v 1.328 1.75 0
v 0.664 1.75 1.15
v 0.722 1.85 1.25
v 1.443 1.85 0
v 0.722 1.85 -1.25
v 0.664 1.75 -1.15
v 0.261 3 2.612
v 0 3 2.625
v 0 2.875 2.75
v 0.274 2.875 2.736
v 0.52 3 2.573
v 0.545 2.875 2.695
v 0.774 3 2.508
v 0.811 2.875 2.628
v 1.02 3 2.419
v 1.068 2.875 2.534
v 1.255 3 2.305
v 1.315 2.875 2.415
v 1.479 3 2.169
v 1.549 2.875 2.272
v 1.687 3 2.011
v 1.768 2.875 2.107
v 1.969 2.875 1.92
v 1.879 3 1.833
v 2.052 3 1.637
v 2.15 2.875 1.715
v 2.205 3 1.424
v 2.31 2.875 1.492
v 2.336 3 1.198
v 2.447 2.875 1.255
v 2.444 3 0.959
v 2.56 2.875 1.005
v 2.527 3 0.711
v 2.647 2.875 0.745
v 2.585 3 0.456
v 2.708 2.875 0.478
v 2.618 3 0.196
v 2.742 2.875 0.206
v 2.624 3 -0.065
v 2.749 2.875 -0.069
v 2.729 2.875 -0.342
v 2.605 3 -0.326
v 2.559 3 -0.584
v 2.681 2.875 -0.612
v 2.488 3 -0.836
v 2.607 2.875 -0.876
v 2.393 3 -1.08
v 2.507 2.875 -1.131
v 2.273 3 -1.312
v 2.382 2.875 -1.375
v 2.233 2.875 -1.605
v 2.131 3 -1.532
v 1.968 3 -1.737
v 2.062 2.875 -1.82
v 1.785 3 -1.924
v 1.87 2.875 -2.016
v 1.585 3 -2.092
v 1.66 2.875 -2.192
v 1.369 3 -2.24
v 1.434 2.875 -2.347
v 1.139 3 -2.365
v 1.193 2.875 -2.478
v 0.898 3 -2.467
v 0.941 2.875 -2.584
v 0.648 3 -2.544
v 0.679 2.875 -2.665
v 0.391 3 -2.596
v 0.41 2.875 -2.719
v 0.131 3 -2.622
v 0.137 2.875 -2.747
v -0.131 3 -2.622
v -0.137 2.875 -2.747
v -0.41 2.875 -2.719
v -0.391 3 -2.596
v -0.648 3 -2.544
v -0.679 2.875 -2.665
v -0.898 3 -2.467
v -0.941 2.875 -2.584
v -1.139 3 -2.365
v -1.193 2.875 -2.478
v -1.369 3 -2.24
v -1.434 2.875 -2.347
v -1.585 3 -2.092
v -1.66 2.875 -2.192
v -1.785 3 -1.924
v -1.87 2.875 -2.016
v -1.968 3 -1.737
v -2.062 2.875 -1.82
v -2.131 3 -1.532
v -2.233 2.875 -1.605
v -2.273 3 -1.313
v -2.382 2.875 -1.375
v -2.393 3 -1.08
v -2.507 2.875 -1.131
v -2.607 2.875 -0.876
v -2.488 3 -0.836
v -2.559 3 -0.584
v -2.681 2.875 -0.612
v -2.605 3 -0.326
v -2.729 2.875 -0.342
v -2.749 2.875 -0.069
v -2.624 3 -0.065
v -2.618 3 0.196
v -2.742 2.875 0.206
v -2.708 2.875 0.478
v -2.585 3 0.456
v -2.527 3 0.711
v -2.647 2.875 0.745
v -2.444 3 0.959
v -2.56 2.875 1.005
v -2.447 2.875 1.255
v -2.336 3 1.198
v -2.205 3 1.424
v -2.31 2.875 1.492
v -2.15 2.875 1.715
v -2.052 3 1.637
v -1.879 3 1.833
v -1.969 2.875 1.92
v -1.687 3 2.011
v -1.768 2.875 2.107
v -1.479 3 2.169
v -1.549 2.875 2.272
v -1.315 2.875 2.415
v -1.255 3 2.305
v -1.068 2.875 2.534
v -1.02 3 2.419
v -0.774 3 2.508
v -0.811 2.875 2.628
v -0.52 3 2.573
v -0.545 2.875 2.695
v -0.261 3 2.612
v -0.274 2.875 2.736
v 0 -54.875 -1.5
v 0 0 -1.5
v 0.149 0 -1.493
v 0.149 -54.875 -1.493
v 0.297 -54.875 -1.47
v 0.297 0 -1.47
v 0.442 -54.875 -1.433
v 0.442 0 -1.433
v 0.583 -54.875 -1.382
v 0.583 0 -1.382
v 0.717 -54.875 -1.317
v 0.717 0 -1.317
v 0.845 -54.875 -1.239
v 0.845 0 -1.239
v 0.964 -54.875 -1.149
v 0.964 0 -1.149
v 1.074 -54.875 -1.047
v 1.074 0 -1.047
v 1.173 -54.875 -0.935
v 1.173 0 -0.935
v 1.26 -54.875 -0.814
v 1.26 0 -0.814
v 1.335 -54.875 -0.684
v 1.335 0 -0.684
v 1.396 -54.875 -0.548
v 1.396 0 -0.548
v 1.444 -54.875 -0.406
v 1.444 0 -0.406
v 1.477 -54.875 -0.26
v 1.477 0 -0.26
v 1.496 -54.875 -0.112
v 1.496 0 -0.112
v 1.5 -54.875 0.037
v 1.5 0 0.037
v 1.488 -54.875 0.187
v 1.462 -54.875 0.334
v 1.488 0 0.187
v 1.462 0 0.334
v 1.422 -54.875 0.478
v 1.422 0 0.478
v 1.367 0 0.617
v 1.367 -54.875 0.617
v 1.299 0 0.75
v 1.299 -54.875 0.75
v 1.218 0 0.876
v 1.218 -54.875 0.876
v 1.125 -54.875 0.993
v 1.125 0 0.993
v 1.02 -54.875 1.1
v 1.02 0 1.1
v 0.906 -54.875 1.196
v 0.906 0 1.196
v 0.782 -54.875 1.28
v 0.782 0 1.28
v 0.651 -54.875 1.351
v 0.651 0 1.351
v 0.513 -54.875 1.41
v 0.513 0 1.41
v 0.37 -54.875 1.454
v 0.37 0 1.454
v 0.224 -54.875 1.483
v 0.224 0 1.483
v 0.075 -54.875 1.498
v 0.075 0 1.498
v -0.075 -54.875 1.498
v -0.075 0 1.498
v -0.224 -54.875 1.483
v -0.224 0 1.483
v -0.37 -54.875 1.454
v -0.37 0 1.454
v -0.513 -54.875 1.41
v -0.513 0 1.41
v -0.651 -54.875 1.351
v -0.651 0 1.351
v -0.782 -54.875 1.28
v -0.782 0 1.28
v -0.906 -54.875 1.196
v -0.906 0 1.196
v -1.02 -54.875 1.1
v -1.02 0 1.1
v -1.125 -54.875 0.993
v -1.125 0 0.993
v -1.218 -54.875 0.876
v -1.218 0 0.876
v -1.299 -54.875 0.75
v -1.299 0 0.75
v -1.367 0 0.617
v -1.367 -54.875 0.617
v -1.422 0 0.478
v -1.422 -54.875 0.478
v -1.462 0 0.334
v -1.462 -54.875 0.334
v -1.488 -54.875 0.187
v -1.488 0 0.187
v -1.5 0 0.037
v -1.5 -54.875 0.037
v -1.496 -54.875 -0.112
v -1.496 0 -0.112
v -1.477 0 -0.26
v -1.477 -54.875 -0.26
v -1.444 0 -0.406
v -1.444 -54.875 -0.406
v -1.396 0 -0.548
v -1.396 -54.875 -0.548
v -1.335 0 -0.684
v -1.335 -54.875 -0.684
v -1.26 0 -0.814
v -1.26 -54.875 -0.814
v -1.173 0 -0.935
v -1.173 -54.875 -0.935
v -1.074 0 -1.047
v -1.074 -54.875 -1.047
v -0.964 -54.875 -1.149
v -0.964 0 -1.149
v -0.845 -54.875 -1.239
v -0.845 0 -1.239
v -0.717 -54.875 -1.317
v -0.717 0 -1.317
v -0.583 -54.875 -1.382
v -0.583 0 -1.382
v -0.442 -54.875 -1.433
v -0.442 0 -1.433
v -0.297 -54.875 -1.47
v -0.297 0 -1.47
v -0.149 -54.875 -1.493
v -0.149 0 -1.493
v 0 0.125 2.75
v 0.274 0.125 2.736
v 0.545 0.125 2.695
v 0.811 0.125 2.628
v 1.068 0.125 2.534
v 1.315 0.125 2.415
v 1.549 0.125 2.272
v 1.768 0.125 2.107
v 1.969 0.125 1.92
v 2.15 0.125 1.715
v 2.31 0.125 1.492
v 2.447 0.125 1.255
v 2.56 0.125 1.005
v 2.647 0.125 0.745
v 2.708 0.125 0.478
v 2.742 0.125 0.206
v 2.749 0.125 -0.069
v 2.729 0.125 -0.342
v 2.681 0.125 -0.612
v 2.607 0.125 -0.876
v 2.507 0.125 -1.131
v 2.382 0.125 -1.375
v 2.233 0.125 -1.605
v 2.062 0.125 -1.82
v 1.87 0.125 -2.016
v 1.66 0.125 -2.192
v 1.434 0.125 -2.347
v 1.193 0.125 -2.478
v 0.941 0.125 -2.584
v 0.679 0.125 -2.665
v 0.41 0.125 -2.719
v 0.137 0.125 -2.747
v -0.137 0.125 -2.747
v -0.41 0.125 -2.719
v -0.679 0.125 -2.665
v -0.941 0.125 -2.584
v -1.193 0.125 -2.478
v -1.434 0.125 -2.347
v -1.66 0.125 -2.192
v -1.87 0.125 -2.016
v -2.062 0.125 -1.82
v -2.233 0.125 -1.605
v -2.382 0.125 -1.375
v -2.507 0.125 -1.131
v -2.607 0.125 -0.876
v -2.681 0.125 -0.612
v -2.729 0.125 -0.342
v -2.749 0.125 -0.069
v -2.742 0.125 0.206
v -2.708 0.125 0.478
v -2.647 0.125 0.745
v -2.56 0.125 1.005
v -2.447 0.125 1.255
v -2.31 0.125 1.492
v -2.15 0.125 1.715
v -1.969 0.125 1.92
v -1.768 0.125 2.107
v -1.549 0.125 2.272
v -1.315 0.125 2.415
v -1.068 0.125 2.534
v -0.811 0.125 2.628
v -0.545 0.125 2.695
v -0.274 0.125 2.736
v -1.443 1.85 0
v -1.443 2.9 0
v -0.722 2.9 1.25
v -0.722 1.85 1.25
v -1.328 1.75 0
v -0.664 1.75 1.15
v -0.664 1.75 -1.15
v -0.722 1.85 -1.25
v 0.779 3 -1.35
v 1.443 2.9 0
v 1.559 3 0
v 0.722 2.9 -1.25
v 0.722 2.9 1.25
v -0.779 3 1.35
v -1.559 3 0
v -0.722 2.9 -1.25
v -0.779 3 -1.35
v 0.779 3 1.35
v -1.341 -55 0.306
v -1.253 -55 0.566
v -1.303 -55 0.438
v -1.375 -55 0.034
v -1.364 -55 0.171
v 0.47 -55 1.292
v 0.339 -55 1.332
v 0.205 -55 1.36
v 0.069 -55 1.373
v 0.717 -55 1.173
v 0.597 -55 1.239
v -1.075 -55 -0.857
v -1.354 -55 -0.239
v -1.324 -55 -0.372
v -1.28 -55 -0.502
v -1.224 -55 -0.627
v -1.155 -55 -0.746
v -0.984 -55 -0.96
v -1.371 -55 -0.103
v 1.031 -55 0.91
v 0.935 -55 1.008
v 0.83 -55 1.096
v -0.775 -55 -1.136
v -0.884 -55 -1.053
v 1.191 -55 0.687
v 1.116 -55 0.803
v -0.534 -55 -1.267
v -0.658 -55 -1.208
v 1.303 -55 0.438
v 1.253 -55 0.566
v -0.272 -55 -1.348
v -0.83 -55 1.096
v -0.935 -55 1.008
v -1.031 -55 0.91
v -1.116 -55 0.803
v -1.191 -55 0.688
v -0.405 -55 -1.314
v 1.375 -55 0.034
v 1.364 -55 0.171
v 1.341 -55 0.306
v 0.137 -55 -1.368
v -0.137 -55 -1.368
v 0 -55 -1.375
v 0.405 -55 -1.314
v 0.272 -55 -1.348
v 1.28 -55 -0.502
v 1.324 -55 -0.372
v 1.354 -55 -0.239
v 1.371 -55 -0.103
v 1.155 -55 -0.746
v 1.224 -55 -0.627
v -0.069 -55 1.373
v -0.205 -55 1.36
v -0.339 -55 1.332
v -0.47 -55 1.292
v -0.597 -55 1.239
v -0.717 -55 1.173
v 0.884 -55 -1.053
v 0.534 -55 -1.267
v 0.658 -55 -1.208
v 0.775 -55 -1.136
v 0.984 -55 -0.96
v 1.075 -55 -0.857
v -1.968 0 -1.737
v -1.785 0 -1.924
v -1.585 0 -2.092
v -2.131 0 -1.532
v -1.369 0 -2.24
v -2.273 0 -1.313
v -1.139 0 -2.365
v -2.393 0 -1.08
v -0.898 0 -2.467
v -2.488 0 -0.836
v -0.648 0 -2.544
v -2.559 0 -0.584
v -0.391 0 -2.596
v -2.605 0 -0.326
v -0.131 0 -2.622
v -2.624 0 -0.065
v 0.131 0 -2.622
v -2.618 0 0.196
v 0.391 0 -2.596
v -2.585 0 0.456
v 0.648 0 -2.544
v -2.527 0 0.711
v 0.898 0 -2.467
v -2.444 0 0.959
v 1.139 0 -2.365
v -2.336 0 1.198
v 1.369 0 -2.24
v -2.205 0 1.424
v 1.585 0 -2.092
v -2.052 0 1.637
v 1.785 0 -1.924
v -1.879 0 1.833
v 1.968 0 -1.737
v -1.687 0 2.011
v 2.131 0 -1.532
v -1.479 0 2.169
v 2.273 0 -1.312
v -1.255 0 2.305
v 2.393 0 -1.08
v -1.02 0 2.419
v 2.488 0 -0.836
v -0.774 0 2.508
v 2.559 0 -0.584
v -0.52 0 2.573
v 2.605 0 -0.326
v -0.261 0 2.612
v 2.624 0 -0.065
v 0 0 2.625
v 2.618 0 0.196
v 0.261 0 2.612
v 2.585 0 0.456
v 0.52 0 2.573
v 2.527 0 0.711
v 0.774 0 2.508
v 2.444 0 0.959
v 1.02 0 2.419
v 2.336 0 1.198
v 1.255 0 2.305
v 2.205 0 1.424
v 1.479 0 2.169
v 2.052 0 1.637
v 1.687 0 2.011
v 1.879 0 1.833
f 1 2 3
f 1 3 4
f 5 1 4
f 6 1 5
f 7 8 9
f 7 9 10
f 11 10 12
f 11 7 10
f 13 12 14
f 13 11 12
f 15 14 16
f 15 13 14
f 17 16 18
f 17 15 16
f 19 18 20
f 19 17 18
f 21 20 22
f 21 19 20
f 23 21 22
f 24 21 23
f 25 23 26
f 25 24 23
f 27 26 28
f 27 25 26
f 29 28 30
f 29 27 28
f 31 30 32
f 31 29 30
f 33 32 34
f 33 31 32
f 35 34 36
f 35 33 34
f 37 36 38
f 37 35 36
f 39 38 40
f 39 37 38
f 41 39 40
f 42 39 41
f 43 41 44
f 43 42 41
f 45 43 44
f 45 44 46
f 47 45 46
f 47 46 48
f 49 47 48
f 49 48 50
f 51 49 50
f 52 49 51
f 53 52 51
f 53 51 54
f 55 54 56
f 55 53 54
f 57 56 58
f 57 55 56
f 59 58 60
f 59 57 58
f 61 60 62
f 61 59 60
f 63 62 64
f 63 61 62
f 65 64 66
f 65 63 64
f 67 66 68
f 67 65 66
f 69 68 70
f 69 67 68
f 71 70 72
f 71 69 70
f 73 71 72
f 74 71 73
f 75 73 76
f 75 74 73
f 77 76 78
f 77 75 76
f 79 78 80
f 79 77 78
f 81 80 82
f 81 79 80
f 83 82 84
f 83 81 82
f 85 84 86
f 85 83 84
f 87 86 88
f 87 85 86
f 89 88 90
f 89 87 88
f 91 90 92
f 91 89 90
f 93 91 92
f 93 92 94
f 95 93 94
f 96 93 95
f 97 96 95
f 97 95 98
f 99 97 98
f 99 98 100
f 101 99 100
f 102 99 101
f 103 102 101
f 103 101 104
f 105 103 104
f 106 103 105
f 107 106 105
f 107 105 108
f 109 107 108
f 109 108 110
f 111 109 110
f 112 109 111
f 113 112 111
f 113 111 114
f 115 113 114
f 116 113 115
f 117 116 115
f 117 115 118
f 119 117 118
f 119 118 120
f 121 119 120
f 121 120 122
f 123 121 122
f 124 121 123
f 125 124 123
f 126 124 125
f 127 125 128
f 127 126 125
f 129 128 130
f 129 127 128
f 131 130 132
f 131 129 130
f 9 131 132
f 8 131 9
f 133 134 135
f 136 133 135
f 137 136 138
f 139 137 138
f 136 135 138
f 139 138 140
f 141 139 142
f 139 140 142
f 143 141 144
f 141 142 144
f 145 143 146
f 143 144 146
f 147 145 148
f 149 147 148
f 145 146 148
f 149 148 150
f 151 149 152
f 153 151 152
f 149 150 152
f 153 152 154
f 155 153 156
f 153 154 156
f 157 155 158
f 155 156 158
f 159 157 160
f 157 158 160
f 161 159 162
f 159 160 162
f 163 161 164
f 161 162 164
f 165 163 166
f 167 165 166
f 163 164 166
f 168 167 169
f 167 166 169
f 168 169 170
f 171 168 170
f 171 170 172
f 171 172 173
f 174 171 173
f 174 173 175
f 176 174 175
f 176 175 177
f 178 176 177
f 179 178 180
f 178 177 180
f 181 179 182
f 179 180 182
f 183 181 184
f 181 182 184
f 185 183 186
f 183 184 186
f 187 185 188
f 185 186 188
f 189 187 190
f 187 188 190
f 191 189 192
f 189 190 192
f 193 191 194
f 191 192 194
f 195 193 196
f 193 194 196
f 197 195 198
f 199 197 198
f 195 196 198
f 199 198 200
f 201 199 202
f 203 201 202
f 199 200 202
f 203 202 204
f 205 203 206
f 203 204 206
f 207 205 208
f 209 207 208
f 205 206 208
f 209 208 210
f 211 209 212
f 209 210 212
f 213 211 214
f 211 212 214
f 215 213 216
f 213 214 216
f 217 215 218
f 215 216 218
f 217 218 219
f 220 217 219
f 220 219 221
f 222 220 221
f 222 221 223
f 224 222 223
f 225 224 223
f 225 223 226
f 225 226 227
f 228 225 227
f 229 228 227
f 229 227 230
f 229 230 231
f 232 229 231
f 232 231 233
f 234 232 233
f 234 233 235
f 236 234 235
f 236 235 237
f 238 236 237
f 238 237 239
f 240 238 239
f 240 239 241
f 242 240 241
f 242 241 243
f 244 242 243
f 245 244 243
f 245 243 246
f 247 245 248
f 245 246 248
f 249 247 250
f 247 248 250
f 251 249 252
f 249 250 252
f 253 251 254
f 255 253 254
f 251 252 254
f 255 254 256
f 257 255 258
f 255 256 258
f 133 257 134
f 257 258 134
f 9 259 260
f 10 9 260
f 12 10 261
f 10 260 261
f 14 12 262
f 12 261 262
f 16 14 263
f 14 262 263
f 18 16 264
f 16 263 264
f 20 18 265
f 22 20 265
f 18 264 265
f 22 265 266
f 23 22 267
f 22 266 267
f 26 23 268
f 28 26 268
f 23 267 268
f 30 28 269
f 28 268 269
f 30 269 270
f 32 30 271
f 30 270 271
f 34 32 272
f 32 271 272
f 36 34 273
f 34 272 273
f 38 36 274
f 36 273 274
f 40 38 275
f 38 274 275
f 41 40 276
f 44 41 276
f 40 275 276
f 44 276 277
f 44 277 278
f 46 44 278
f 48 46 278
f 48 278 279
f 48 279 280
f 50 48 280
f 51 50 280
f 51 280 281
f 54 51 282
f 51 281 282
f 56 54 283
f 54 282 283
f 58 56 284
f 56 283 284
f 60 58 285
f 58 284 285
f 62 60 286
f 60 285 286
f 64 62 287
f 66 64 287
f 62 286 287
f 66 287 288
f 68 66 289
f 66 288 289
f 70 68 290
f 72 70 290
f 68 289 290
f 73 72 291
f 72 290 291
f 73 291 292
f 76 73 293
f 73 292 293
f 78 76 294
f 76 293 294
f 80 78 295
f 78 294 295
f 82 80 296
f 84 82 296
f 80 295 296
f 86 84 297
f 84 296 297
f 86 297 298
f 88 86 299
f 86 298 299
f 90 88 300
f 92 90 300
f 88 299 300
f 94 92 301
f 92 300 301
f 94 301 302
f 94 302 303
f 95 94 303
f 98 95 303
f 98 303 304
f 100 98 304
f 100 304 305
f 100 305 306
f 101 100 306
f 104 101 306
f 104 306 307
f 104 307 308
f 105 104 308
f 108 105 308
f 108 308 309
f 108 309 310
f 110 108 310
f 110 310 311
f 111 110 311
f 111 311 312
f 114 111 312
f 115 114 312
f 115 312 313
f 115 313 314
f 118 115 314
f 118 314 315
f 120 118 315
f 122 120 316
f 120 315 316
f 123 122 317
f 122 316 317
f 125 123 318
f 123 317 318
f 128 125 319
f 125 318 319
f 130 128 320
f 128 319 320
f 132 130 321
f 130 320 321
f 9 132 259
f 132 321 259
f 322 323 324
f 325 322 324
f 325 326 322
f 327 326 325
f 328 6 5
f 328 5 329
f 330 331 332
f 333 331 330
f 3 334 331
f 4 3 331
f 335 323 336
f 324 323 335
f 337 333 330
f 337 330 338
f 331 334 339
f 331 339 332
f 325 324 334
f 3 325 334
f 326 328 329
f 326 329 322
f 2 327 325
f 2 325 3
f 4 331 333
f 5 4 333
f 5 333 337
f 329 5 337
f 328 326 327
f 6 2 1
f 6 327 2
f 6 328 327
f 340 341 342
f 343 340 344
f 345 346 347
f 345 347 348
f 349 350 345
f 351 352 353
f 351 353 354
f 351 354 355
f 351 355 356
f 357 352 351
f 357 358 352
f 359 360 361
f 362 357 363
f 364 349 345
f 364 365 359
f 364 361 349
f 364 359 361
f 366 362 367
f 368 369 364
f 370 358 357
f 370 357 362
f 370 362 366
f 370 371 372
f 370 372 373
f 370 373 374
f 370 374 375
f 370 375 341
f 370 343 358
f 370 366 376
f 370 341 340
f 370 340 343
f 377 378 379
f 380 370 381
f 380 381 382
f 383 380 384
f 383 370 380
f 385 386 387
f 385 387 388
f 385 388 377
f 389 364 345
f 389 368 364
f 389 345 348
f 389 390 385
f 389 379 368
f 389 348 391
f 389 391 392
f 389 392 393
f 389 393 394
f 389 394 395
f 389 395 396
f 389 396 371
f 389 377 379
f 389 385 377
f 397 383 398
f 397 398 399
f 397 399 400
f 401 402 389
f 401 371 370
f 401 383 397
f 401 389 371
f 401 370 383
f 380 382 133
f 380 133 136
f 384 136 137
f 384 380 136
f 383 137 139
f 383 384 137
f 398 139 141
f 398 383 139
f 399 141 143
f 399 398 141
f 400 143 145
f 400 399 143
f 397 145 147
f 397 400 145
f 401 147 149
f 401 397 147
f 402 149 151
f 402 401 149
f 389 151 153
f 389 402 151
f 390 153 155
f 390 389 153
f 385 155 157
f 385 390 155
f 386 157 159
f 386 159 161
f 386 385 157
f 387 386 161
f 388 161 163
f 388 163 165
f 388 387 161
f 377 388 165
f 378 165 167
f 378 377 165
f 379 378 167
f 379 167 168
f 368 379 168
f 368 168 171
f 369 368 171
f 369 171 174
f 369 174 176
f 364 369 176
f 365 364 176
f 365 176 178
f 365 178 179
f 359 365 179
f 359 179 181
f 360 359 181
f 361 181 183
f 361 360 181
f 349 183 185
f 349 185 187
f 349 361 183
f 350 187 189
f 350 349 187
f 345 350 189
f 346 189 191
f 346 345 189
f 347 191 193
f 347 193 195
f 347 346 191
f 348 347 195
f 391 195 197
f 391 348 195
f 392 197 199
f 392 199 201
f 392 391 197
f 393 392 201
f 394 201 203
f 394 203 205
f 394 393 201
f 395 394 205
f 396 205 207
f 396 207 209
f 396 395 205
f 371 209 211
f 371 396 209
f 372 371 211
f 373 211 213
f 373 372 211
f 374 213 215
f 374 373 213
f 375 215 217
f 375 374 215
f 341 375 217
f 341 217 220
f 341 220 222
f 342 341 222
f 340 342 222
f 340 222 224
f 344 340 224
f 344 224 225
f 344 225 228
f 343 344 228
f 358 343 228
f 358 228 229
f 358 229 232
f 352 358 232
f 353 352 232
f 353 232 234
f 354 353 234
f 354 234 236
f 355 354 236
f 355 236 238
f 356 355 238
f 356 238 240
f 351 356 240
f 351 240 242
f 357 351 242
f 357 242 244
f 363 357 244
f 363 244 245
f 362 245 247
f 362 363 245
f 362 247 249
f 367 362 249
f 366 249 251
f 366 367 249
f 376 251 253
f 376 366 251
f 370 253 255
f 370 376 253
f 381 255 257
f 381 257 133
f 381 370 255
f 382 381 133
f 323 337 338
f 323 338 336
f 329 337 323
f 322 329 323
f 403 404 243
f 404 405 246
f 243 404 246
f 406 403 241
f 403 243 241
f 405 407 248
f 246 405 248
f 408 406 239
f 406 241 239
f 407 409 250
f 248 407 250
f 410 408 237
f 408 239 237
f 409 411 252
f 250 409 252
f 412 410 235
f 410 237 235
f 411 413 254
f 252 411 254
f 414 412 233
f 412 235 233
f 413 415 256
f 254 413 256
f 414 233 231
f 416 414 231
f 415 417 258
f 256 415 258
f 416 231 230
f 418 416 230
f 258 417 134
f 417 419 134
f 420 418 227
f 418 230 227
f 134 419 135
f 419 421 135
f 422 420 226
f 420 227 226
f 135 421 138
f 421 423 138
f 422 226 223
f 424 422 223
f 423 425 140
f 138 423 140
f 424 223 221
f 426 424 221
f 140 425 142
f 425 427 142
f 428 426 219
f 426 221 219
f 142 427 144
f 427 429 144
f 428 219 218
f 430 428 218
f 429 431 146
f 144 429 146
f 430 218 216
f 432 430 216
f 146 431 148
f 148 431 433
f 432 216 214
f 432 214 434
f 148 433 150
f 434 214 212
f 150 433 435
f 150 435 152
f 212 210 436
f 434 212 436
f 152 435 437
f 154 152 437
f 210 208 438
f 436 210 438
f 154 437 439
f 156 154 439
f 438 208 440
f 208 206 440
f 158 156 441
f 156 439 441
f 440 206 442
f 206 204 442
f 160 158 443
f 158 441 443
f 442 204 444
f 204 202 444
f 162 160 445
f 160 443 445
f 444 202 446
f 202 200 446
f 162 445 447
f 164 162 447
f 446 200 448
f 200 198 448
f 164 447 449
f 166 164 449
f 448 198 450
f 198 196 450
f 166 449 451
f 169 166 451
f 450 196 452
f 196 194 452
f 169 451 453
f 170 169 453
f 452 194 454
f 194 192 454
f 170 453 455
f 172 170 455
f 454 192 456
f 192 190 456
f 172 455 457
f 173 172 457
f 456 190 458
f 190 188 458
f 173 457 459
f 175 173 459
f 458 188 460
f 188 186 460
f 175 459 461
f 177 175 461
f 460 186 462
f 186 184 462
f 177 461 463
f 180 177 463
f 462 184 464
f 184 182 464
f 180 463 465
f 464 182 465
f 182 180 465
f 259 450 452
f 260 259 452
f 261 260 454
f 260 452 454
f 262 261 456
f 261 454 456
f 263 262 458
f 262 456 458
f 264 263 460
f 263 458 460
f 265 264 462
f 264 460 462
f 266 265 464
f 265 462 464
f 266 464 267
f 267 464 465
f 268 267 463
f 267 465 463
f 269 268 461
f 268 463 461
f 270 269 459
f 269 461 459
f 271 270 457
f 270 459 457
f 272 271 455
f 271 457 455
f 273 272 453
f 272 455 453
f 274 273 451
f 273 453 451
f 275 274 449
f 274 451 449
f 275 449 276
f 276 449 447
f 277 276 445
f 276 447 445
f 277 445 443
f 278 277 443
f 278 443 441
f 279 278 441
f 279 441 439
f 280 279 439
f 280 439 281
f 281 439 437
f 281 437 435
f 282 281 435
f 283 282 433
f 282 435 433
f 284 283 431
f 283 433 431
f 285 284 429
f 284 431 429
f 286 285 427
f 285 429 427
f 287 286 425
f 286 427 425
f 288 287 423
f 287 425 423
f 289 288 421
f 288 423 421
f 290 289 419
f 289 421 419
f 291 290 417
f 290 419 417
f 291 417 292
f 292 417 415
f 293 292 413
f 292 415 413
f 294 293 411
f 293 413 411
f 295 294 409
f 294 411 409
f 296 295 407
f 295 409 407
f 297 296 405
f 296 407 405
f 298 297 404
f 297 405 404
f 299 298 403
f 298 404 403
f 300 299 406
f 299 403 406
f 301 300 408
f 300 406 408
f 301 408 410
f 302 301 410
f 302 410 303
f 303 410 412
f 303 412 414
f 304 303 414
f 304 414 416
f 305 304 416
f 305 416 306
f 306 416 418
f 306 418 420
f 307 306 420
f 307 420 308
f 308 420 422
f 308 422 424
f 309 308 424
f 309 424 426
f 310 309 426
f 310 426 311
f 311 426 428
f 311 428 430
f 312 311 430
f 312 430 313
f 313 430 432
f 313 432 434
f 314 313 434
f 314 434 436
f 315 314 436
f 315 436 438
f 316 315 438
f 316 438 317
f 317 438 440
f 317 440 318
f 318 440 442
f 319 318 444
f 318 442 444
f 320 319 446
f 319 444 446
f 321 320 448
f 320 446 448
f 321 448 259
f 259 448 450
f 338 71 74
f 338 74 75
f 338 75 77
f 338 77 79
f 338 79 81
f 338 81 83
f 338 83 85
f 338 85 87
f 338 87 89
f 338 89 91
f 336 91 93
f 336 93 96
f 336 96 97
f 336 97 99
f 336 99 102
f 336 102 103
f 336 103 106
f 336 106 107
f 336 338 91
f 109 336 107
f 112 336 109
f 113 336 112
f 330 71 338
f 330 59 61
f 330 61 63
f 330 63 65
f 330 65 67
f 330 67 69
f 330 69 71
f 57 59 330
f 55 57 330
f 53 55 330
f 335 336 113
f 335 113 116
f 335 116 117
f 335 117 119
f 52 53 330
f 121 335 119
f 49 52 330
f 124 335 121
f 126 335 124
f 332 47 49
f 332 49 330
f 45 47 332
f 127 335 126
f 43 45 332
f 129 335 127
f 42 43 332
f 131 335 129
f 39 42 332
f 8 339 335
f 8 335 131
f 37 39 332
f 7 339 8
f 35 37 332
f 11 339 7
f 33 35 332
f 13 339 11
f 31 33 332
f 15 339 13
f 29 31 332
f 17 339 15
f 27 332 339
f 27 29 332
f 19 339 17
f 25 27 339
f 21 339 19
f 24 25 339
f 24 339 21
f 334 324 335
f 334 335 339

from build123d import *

# Parameters (mm, degrees)
SKETCH1_R           = 2.75
BOSS_EXTRUDE1_DEPTH = 3
SKETCH2_R           = 1.5
BOSS_EXTRUDE2_DEPTH = 55
CHAMFER1_SIZE       = 0.125
CHAMFER2_SIZE       = 0.125
CUT_EXTRUDE1_DEPTH  = 1.25
CHAMFER3_SIZE       = 0.1
CHAMFER4_SIZE       = 0.1


with BuildPart() as part:
    # Sketch1 → Boss-Extrude1 (new body)
    with BuildSketch(Plane(origin=(0, 0, 0), x_dir=(1, 0, 0), z_dir=(0, 1, 0))):
        with Locations(Location((0, 0, 0), (0, 0, 270))):
            Circle(SKETCH1_R)
    extrude(amount=BOSS_EXTRUDE1_DEPTH)

    # Sketch2 → Boss-Extrude2 (add)
    with BuildSketch(Plane(origin=(0, 0, 0), x_dir=(-1, 0, 0), z_dir=(0, -1, 0))):
        with Locations(Location((0, 0, 0), (0, 0, 90))):
            Circle(SKETCH2_R)
    extrude(amount=BOSS_EXTRUDE2_DEPTH)

    # Chamfer1
    chamfer1_edges = [part.edges().sort_by_distance(p)[0] for p in [
        (0, 0, -2.75),
        (0, 3, -2.75),
    ]]
    chamfer(chamfer1_edges, length=CHAMFER1_SIZE)

    # Chamfer2
    chamfer2_edges = [part.edges().sort_by_distance(p)[0] for p in [
        (0, -55, 1.5),
    ]]
    chamfer(chamfer2_edges, length=CHAMFER2_SIZE)

    # Sketch3 → Cut-Extrude1 (cut)
    with BuildSketch(Plane(origin=(0, 3, 0), x_dir=(1, 0, 0), z_dir=(0, 1, 0))):
        Polygon((1.443375673, 0), (0.721687836, 1.25), (-0.721687836, 1.25), (-1.443375673, 0), (-0.721687836, -1.25), (0.721687836, -1.25), align=None)
    extrude(amount=-CUT_EXTRUDE1_DEPTH, mode=Mode.SUBTRACT)

    # Chamfer3
    chamfer3_edges = [part.edges().sort_by_distance(p)[0] for p in [
        (1.082531755, 3, 0.625),
        (1.082531755, 3, -0.625),
        (0, 3, -1.25),
        (-1.082531755, 3, -0.625),
        (-1.082531755, 3, 0.625),
        (0, 3, 1.25),
    ]]
    chamfer(chamfer3_edges, length=CHAMFER3_SIZE)

    # Chamfer4
    chamfer4_edges = [part.edges().sort_by_distance(p)[0] for p in [
        (1.082531755, 1.75, 0.625),
        (0, 1.75, 1.25),
        (-1.082531755, 1.75, 0.625),
        (-1.082531755, 1.75, -0.625),
        (0, 1.75, -1.25),
        (1.082531755, 1.75, -0.625),
    ]]
    chamfer(chamfer4_edges, length=CHAMFER4_SIZE)


solid = part.part
